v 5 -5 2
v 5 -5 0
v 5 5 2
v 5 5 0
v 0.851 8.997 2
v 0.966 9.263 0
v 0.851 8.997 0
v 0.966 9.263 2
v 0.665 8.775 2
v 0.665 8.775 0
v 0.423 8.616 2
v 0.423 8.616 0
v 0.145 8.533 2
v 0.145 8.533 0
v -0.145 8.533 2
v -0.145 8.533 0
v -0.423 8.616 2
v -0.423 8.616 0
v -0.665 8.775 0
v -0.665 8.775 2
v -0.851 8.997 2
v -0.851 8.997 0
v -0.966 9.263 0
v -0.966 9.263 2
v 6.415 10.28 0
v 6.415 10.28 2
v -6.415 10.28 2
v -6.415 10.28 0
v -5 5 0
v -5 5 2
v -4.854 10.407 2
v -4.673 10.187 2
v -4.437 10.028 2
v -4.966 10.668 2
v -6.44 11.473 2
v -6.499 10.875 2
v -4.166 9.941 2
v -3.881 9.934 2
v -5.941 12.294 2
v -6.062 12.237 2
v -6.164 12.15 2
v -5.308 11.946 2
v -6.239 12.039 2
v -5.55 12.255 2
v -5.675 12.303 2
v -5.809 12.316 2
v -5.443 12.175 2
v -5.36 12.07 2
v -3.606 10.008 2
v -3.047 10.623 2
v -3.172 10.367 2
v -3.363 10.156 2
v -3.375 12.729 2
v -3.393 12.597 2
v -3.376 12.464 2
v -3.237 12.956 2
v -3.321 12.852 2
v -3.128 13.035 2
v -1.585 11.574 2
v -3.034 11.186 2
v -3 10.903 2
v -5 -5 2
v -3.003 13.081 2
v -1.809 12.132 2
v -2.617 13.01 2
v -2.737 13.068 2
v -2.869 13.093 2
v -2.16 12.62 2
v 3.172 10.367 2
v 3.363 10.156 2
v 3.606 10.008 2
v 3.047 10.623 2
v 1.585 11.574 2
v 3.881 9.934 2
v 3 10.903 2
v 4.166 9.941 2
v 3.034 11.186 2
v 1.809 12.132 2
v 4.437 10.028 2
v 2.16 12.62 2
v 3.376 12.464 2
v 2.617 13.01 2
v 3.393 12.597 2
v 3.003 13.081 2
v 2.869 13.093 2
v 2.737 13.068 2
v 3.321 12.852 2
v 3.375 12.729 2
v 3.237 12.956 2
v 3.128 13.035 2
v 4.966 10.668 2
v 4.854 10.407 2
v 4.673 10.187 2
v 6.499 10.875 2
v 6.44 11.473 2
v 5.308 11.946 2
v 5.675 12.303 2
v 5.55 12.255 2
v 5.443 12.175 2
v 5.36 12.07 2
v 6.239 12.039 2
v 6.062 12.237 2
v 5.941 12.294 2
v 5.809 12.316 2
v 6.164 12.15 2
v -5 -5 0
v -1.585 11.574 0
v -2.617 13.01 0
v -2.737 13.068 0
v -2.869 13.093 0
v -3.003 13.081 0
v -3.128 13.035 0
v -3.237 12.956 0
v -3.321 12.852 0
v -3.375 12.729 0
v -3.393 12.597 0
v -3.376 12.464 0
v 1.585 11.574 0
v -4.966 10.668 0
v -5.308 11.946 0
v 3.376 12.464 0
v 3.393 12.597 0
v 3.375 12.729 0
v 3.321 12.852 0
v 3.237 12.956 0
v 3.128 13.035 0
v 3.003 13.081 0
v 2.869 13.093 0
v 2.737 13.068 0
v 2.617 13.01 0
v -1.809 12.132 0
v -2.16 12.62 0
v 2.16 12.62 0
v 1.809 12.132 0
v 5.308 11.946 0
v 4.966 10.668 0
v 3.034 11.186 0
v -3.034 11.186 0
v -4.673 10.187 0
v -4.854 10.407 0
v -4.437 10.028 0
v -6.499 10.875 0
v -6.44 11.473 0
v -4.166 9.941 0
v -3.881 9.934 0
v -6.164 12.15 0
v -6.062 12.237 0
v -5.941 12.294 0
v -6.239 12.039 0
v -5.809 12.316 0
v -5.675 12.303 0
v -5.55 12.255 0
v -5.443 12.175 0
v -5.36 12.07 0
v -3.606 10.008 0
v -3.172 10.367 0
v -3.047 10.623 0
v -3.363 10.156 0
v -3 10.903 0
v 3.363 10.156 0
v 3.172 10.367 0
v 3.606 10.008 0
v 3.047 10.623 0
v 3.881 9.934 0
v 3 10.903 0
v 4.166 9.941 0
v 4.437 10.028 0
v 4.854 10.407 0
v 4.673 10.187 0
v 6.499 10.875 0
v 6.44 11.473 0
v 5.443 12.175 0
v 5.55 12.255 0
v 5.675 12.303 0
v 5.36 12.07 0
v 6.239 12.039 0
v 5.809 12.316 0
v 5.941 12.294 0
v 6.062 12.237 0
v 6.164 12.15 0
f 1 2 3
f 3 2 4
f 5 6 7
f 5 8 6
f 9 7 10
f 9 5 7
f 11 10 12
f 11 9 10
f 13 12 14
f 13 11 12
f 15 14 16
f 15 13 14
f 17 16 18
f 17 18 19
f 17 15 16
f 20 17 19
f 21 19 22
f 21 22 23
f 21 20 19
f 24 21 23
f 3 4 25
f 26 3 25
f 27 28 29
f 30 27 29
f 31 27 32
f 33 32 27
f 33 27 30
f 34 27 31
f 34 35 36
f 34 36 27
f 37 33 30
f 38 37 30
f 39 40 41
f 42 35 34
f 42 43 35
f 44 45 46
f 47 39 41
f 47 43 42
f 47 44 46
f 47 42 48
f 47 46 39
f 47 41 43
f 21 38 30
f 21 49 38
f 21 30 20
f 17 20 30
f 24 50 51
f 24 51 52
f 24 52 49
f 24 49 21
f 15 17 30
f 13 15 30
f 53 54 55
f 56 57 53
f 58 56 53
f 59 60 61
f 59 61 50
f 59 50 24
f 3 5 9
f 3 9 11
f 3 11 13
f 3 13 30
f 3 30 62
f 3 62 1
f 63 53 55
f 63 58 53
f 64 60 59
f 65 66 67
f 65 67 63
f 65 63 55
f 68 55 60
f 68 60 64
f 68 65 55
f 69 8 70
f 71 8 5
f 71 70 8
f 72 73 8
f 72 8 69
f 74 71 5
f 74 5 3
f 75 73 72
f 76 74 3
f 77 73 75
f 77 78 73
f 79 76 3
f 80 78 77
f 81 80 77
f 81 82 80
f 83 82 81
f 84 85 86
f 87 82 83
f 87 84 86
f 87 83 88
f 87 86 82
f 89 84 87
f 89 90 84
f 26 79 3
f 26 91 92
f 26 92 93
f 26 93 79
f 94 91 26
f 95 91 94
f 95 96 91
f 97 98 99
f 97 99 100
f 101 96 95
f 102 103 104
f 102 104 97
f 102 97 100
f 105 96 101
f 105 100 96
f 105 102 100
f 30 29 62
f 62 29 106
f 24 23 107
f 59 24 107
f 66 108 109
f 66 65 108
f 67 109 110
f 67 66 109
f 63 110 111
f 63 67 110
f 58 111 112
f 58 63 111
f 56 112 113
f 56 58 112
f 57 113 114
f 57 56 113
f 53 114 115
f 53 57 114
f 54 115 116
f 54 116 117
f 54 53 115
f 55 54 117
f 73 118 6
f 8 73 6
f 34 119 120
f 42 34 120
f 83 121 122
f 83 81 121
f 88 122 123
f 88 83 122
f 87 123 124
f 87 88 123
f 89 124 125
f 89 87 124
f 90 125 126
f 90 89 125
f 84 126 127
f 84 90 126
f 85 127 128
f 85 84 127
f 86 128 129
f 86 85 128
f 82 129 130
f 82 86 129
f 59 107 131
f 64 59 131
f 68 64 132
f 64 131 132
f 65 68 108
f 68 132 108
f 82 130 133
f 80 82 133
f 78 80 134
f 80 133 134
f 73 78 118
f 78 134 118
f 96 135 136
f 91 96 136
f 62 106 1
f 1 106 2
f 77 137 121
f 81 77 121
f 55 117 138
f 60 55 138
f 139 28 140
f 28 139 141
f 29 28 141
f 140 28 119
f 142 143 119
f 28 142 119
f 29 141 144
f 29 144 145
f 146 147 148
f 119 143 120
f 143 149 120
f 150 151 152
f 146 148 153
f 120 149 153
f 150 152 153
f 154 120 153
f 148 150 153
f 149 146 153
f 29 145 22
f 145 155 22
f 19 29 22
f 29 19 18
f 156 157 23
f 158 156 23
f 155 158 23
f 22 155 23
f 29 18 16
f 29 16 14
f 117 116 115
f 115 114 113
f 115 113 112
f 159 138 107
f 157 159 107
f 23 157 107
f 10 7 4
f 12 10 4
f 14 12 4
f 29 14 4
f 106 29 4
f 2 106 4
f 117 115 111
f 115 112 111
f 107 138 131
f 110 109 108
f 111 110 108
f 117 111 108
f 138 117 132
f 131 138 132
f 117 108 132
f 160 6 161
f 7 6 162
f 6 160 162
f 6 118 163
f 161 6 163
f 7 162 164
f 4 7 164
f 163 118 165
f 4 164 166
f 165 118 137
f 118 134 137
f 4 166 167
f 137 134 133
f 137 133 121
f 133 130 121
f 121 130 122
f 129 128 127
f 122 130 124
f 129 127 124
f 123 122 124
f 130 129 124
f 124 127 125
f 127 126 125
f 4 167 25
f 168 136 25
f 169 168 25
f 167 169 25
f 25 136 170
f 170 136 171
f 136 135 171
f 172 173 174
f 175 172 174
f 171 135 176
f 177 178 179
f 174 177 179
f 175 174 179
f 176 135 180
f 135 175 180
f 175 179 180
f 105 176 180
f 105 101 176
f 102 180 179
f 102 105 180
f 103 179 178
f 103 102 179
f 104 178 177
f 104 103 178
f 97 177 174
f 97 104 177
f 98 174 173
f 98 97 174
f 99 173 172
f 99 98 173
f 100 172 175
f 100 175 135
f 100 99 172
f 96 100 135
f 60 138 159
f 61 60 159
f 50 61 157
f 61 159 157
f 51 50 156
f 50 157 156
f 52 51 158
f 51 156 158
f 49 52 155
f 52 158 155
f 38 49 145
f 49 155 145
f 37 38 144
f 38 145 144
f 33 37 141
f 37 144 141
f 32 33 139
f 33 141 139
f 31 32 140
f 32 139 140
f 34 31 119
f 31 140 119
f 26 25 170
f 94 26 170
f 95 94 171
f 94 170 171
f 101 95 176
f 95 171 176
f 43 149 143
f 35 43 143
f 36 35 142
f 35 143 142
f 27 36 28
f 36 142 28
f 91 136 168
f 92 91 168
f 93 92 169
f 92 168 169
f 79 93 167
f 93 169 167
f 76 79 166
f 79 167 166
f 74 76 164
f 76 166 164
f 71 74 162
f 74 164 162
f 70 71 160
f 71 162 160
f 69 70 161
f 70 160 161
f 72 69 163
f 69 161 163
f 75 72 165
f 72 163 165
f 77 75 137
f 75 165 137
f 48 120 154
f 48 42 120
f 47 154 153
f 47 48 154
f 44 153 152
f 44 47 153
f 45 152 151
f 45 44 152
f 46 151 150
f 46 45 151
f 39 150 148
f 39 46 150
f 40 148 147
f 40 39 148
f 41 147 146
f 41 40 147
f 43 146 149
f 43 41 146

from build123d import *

# Parameters (mm, degrees)
BOSS_EXTRUDE1_DEPTH = 2
FILLET1_R           = 0.5
FILLET2_R           = 1


with BuildPart() as part:
    # Sketch1 → Boss-Extrude1 (new body)
    with BuildSketch(Plane.XY):
        with BuildLine():
            Line((-6.414814566, 10.280159843), (-5, 5))
            Line((-5, 5), (-5, -5))
            Line((-5, -5), (5, -5))
            Line((5, -5), (5, 5))
            Line((5, 5), (6.414814566, 10.280159843))
            ThreePointArc((6.414814566, 10.280159843), (6.374781392, 11.708496992), (5.558954759, 12.881602518))
            Line((5.558954759, 12.881602518), (4.965925826, 10.66838841))
            ThreePointArc((4.965925826, 10.66838841), (3.741180955, 9.961281629), (3.034074174, 11.1860265))
            Line((3.034074174, 11.1860265), (3.627103106, 13.399240608))
            ThreePointArc((3.627103106, 13.399240608), (2.334023755, 12.791214738), (1.585185434, 11.574255068))
            Line((1.585185434, 11.574255068), (0, 5.658262488))
            Line((0, 5.658262488), (-1.585185434, 11.574255068))
            ThreePointArc((-1.585185434, 11.574255068), (-2.334023755, 12.791214738), (-3.627103106, 13.399240608))
            Line((-3.627103106, 13.399240608), (-3.034074174, 11.1860265))
            ThreePointArc((-3.034074174, 11.1860265), (-3.741180955, 9.961281629), (-4.965925826, 10.66838841))
            Line((-4.965925826, 10.66838841), (-5.558954759, 12.881602518))
            ThreePointArc((-5.558954759, 12.881602518), (-6.374781392, 11.708496992), (-6.414814566, 10.280159843))
        make_face()
    extrude(amount=BOSS_EXTRUDE1_DEPTH)

    # Fillet1
    fillet1_edges = [part.edges().sort_by_distance(p)[0] for p in [
        (5.558954759, 12.881602518, 1),
        (-5.558954759, 12.881602518, 1),
        (-3.627103106, 13.399240608, 1),
        (3.627103106, 13.399240608, 1),
    ]]
    fillet(fillet1_edges, radius=FILLET1_R)

    # Fillet2
    fillet2_edges = [part.edges().sort_by_distance(p)[0] for p in [
        (0, 5.658262488, 1),
    ]]
    fillet(fillet2_edges, radius=FILLET2_R)


solid = part.part
